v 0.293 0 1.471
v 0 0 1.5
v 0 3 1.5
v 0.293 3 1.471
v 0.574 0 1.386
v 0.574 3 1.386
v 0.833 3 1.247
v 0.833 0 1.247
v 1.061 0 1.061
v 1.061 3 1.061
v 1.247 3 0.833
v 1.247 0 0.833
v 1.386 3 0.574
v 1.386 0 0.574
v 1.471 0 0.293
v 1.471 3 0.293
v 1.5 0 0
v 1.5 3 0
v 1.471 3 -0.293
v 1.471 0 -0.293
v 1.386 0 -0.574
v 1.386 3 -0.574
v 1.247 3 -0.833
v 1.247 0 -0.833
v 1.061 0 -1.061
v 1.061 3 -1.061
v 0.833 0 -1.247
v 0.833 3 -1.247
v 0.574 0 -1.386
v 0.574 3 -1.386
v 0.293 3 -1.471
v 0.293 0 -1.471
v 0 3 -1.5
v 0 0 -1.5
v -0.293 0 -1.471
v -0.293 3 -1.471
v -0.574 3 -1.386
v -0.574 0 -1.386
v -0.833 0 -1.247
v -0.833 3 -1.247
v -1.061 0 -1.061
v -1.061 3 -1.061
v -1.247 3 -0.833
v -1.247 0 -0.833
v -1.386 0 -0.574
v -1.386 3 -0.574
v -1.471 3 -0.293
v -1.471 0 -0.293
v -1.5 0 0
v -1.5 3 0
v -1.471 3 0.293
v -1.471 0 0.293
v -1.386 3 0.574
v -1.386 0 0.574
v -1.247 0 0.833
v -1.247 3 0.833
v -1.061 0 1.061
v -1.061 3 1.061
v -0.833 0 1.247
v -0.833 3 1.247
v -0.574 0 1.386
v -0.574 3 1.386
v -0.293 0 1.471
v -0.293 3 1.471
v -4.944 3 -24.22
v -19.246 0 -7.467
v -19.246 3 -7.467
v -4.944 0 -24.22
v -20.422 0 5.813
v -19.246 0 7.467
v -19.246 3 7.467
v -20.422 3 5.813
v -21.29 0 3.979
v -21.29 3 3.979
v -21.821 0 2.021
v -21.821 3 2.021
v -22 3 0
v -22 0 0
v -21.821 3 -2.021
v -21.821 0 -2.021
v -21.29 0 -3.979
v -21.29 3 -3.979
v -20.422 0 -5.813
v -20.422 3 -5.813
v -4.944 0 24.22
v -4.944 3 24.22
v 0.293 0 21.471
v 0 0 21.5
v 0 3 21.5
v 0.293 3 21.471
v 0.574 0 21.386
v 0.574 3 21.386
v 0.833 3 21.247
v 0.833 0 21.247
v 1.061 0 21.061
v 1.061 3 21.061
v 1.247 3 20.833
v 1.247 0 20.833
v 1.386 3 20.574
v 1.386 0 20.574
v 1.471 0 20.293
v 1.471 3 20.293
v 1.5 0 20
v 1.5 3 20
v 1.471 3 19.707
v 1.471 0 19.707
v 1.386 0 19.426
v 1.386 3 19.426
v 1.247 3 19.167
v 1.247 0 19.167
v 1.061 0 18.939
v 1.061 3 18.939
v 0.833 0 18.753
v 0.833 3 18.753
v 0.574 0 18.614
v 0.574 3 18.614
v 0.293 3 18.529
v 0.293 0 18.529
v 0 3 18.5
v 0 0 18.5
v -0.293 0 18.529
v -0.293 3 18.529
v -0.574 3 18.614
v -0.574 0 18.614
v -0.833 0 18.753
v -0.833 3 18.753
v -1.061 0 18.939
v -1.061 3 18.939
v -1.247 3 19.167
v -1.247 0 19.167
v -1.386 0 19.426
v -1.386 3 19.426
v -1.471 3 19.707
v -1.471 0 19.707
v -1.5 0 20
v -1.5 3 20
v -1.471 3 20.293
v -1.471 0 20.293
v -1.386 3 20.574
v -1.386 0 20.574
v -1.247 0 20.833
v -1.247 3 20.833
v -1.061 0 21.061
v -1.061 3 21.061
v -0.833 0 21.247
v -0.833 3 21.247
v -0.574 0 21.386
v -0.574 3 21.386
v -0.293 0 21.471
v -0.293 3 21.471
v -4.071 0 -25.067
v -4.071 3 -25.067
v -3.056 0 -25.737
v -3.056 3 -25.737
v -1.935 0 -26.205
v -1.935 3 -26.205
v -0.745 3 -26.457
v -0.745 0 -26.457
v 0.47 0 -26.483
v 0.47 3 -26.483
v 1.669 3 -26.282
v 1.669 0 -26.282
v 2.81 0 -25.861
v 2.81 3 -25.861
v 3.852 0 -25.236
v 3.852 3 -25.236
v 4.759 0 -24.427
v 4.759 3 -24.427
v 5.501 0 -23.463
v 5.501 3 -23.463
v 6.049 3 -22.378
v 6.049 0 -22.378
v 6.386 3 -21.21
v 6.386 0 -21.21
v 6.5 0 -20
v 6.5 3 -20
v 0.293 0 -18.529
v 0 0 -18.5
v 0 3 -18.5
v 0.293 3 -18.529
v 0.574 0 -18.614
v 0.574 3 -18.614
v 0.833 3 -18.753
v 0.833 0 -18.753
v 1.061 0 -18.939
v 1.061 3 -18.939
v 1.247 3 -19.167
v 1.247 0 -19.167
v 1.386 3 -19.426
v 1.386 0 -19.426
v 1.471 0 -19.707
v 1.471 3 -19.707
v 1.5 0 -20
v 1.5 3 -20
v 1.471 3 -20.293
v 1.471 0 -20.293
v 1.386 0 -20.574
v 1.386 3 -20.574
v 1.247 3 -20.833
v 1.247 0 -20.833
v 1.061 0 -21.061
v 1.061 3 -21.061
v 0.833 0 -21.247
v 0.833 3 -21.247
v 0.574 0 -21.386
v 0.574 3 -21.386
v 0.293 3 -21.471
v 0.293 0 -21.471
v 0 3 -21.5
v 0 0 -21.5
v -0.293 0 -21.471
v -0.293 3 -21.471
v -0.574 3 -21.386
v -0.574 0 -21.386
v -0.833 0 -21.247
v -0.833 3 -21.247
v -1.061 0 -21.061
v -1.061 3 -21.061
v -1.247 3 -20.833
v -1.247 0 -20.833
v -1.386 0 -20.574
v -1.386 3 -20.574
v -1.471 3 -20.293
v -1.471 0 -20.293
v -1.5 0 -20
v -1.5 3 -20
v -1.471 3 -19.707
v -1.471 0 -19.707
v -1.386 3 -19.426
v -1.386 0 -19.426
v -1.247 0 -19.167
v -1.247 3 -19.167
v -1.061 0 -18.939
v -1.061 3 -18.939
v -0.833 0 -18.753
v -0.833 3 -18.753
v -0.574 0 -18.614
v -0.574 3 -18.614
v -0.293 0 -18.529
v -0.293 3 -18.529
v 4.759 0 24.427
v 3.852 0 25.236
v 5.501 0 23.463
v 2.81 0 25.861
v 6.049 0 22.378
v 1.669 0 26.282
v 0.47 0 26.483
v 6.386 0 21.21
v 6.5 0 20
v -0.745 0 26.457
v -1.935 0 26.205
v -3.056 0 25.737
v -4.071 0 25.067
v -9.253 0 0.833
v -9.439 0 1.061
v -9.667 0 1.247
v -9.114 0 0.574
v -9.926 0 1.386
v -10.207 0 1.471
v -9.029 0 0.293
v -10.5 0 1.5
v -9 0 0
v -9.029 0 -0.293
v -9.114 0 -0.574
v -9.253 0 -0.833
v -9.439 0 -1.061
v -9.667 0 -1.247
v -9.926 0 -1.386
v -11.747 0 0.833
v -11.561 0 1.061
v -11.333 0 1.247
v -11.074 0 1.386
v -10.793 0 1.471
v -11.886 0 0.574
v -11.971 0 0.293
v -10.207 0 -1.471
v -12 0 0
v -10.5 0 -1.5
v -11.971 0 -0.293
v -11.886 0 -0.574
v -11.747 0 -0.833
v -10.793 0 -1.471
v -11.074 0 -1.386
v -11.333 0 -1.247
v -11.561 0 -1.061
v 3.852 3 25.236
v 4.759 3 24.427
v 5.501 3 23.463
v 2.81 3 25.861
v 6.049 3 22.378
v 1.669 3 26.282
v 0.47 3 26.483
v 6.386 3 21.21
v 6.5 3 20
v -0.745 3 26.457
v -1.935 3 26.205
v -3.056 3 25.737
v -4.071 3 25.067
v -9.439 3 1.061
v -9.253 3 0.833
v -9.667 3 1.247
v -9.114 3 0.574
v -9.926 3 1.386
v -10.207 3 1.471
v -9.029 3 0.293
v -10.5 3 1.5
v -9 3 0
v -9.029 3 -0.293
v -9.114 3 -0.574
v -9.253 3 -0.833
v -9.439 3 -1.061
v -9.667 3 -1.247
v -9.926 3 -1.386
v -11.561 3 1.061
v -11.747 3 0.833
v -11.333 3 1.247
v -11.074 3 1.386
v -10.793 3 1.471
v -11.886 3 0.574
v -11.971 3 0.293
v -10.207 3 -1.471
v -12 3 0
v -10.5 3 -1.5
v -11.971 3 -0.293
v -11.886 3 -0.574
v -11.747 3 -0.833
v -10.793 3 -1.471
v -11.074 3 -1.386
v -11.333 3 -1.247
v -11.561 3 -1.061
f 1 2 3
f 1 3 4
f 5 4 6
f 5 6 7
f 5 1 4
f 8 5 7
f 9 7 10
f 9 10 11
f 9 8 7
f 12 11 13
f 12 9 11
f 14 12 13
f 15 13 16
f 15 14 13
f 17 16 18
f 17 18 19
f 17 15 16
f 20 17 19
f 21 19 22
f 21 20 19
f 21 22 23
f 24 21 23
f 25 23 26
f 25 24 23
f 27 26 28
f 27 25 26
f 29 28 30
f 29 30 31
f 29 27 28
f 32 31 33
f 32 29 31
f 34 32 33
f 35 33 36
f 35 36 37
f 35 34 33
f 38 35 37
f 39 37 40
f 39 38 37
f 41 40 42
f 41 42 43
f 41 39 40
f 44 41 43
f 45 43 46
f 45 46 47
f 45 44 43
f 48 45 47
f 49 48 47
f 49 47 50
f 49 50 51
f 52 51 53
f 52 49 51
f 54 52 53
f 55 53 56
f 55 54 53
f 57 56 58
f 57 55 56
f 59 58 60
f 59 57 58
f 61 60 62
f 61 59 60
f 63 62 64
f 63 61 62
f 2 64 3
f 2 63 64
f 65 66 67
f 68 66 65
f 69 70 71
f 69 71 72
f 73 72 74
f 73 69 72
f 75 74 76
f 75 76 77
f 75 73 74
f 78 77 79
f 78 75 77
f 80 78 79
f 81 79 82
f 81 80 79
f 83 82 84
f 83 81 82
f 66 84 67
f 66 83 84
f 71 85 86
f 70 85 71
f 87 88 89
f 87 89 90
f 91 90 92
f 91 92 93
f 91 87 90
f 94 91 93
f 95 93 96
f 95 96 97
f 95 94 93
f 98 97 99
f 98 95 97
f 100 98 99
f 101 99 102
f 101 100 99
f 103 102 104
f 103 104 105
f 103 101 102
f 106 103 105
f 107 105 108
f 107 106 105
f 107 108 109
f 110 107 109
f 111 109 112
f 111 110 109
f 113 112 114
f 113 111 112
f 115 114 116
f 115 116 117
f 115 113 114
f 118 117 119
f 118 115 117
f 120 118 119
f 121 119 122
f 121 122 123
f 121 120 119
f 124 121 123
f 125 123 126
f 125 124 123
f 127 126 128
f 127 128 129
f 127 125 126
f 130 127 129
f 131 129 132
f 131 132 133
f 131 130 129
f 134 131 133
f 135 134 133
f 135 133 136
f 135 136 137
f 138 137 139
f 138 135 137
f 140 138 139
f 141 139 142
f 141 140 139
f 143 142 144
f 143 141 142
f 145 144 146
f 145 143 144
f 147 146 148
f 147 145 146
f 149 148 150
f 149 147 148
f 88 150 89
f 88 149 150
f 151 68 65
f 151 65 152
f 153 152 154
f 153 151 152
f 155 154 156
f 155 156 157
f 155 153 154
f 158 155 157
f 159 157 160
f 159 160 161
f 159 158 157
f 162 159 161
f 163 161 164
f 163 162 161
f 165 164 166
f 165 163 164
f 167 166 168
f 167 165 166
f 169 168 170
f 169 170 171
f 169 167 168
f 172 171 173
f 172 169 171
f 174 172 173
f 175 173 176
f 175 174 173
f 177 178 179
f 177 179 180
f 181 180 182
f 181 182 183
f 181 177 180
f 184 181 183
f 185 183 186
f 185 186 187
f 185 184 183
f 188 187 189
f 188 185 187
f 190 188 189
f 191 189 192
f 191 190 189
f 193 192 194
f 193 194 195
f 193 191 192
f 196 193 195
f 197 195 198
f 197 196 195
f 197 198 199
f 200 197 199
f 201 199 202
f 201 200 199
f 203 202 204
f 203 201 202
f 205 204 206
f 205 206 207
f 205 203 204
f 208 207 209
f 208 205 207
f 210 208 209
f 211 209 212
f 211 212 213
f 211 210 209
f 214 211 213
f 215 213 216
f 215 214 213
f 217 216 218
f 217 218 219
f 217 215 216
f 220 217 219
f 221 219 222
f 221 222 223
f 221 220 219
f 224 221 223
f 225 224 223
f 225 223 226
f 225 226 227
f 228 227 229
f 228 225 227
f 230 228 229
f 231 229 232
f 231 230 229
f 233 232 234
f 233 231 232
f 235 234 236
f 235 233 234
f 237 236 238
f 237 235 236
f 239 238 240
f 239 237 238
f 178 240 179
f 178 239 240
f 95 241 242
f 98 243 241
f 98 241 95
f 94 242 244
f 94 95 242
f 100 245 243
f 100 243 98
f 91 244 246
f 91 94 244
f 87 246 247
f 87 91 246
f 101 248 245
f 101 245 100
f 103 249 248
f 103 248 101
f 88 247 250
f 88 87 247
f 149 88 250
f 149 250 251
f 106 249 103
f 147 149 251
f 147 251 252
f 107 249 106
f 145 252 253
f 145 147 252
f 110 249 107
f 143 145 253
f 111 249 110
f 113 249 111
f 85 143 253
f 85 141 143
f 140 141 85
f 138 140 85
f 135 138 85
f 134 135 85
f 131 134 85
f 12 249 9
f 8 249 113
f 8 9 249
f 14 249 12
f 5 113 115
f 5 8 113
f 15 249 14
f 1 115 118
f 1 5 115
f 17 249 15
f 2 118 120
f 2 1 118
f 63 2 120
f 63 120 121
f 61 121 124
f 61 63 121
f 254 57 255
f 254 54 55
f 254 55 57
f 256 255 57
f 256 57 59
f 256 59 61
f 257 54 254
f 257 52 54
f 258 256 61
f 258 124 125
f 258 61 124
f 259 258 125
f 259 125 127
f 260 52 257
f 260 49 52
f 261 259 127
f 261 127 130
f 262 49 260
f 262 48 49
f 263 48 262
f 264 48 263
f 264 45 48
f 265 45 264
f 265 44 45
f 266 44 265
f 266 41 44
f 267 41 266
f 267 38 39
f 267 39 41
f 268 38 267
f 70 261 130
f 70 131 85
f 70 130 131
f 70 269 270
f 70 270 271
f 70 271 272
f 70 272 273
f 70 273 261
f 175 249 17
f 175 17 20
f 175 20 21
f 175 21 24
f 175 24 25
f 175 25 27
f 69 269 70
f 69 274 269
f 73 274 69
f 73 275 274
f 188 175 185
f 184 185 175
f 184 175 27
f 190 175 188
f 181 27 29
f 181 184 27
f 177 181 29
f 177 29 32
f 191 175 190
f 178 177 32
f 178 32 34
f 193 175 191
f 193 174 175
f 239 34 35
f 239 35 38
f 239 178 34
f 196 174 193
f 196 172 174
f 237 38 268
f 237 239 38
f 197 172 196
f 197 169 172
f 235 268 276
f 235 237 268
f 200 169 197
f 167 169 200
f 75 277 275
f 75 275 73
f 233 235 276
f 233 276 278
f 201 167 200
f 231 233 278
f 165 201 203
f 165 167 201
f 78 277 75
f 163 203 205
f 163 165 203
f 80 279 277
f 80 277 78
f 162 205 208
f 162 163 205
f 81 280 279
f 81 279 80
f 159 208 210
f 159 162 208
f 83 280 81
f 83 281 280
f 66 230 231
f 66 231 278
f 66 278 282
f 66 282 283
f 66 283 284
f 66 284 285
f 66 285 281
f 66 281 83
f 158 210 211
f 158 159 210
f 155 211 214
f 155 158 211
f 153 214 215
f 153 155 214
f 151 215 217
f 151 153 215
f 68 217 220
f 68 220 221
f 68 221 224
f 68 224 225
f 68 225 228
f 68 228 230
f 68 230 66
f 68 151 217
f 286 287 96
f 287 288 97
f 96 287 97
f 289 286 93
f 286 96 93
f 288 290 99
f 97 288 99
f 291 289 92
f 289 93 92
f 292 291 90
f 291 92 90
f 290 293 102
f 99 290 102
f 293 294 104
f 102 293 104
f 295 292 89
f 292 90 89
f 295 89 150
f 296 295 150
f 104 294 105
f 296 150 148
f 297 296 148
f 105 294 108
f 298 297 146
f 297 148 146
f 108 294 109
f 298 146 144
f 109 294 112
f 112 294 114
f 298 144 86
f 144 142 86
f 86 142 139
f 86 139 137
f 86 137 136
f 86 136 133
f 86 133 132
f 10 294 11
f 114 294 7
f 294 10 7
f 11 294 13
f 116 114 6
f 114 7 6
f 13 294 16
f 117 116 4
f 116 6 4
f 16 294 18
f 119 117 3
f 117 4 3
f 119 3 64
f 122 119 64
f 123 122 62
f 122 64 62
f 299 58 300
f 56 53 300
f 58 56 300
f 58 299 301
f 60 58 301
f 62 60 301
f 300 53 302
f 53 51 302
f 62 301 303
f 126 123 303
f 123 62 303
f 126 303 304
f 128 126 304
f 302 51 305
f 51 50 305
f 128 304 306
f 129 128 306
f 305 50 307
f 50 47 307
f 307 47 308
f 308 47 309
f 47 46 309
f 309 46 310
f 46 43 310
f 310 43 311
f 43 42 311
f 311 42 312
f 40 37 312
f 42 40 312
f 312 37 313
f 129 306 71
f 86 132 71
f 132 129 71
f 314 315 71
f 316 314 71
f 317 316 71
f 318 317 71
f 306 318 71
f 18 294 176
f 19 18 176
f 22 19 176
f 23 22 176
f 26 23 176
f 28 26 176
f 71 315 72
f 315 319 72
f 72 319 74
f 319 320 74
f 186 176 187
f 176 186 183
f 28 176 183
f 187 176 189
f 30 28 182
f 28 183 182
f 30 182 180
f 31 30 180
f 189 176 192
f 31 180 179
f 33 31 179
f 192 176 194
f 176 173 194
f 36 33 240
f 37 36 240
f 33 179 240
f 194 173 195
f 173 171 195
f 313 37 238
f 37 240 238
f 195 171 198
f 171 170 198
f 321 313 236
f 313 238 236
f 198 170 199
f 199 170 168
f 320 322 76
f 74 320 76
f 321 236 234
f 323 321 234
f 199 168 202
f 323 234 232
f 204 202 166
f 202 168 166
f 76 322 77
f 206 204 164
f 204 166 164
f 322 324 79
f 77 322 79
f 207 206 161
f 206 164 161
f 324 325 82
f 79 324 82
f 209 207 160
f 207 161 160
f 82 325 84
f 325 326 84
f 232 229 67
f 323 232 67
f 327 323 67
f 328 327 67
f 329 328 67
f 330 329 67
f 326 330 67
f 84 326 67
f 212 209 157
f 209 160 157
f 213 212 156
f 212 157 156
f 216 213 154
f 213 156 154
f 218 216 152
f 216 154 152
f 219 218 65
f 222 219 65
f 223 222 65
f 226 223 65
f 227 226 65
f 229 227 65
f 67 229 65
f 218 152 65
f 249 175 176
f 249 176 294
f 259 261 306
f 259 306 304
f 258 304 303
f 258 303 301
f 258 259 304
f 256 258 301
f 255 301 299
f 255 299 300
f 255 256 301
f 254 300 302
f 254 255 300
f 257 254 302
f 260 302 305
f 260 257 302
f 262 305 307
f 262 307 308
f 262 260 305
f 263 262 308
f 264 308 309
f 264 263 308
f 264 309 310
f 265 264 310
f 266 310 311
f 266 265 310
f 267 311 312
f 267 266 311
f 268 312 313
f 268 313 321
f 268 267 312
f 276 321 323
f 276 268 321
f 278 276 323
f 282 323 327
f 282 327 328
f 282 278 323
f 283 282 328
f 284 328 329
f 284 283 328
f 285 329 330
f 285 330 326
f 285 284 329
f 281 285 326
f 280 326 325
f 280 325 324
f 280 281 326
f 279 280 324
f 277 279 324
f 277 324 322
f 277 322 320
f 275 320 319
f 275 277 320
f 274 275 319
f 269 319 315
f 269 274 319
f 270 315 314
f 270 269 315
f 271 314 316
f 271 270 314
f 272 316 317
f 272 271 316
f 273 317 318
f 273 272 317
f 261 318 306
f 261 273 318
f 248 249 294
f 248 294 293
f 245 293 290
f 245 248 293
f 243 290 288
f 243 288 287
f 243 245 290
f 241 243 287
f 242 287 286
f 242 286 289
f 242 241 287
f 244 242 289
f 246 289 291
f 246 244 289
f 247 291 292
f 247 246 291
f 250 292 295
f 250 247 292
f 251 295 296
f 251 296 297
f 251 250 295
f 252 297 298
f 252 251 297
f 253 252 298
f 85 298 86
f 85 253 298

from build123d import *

# Parameters (mm, degrees)
SKETCH_1_R      = 1.5
EXTRUDE_1_DEPTH = 3


with BuildPart() as part:
    # ｽｹｯﾁ1 → ﾎﾞｽ - 押し出し1 (new body)
    with BuildSketch(Plane(origin=(0, 0, 0), x_dir=(1, 0, 0), z_dir=(0, 1, 0))):
        with BuildLine():
            Line((6.5, 20), (6.5, 0))
            Line((6.5, 0), (6.5, -20))
            ThreePointArc((6.5, -20), (2.24911051, -26.098483575), (-4.94353905, -24.220358001))
            Line((-4.94353905, -24.220358001), (-19.246261396, -7.466787233))
            ThreePointArc((-19.246261396, -7.466787233), (-22, 0), (-19.246261396, 7.466787233))
            Line((-19.246261396, 7.466787233), (-4.94353905, 24.220358001))
            ThreePointArc((-4.94353905, 24.220358001), (2.24911051, 26.098483575), (6.5, 20))
        make_face()
        with Locations(Location((0, 0, 0), (0, 0, 270))):
            Circle(SKETCH_1_R, mode=Mode.SUBTRACT)
        with Locations(Location((0, 20, 0), (0, 0, 270))):
            Circle(SKETCH_1_R, mode=Mode.SUBTRACT)
        with Locations(Location((0, -20, 0), (0, 0, 270))):
            Circle(SKETCH_1_R, mode=Mode.SUBTRACT)
        with Locations(Location((-10.5, 0, 0), (0, 0, 270))):
            Circle(SKETCH_1_R, mode=Mode.SUBTRACT)
    extrude(amount=EXTRUDE_1_DEPTH)


solid = part.part
